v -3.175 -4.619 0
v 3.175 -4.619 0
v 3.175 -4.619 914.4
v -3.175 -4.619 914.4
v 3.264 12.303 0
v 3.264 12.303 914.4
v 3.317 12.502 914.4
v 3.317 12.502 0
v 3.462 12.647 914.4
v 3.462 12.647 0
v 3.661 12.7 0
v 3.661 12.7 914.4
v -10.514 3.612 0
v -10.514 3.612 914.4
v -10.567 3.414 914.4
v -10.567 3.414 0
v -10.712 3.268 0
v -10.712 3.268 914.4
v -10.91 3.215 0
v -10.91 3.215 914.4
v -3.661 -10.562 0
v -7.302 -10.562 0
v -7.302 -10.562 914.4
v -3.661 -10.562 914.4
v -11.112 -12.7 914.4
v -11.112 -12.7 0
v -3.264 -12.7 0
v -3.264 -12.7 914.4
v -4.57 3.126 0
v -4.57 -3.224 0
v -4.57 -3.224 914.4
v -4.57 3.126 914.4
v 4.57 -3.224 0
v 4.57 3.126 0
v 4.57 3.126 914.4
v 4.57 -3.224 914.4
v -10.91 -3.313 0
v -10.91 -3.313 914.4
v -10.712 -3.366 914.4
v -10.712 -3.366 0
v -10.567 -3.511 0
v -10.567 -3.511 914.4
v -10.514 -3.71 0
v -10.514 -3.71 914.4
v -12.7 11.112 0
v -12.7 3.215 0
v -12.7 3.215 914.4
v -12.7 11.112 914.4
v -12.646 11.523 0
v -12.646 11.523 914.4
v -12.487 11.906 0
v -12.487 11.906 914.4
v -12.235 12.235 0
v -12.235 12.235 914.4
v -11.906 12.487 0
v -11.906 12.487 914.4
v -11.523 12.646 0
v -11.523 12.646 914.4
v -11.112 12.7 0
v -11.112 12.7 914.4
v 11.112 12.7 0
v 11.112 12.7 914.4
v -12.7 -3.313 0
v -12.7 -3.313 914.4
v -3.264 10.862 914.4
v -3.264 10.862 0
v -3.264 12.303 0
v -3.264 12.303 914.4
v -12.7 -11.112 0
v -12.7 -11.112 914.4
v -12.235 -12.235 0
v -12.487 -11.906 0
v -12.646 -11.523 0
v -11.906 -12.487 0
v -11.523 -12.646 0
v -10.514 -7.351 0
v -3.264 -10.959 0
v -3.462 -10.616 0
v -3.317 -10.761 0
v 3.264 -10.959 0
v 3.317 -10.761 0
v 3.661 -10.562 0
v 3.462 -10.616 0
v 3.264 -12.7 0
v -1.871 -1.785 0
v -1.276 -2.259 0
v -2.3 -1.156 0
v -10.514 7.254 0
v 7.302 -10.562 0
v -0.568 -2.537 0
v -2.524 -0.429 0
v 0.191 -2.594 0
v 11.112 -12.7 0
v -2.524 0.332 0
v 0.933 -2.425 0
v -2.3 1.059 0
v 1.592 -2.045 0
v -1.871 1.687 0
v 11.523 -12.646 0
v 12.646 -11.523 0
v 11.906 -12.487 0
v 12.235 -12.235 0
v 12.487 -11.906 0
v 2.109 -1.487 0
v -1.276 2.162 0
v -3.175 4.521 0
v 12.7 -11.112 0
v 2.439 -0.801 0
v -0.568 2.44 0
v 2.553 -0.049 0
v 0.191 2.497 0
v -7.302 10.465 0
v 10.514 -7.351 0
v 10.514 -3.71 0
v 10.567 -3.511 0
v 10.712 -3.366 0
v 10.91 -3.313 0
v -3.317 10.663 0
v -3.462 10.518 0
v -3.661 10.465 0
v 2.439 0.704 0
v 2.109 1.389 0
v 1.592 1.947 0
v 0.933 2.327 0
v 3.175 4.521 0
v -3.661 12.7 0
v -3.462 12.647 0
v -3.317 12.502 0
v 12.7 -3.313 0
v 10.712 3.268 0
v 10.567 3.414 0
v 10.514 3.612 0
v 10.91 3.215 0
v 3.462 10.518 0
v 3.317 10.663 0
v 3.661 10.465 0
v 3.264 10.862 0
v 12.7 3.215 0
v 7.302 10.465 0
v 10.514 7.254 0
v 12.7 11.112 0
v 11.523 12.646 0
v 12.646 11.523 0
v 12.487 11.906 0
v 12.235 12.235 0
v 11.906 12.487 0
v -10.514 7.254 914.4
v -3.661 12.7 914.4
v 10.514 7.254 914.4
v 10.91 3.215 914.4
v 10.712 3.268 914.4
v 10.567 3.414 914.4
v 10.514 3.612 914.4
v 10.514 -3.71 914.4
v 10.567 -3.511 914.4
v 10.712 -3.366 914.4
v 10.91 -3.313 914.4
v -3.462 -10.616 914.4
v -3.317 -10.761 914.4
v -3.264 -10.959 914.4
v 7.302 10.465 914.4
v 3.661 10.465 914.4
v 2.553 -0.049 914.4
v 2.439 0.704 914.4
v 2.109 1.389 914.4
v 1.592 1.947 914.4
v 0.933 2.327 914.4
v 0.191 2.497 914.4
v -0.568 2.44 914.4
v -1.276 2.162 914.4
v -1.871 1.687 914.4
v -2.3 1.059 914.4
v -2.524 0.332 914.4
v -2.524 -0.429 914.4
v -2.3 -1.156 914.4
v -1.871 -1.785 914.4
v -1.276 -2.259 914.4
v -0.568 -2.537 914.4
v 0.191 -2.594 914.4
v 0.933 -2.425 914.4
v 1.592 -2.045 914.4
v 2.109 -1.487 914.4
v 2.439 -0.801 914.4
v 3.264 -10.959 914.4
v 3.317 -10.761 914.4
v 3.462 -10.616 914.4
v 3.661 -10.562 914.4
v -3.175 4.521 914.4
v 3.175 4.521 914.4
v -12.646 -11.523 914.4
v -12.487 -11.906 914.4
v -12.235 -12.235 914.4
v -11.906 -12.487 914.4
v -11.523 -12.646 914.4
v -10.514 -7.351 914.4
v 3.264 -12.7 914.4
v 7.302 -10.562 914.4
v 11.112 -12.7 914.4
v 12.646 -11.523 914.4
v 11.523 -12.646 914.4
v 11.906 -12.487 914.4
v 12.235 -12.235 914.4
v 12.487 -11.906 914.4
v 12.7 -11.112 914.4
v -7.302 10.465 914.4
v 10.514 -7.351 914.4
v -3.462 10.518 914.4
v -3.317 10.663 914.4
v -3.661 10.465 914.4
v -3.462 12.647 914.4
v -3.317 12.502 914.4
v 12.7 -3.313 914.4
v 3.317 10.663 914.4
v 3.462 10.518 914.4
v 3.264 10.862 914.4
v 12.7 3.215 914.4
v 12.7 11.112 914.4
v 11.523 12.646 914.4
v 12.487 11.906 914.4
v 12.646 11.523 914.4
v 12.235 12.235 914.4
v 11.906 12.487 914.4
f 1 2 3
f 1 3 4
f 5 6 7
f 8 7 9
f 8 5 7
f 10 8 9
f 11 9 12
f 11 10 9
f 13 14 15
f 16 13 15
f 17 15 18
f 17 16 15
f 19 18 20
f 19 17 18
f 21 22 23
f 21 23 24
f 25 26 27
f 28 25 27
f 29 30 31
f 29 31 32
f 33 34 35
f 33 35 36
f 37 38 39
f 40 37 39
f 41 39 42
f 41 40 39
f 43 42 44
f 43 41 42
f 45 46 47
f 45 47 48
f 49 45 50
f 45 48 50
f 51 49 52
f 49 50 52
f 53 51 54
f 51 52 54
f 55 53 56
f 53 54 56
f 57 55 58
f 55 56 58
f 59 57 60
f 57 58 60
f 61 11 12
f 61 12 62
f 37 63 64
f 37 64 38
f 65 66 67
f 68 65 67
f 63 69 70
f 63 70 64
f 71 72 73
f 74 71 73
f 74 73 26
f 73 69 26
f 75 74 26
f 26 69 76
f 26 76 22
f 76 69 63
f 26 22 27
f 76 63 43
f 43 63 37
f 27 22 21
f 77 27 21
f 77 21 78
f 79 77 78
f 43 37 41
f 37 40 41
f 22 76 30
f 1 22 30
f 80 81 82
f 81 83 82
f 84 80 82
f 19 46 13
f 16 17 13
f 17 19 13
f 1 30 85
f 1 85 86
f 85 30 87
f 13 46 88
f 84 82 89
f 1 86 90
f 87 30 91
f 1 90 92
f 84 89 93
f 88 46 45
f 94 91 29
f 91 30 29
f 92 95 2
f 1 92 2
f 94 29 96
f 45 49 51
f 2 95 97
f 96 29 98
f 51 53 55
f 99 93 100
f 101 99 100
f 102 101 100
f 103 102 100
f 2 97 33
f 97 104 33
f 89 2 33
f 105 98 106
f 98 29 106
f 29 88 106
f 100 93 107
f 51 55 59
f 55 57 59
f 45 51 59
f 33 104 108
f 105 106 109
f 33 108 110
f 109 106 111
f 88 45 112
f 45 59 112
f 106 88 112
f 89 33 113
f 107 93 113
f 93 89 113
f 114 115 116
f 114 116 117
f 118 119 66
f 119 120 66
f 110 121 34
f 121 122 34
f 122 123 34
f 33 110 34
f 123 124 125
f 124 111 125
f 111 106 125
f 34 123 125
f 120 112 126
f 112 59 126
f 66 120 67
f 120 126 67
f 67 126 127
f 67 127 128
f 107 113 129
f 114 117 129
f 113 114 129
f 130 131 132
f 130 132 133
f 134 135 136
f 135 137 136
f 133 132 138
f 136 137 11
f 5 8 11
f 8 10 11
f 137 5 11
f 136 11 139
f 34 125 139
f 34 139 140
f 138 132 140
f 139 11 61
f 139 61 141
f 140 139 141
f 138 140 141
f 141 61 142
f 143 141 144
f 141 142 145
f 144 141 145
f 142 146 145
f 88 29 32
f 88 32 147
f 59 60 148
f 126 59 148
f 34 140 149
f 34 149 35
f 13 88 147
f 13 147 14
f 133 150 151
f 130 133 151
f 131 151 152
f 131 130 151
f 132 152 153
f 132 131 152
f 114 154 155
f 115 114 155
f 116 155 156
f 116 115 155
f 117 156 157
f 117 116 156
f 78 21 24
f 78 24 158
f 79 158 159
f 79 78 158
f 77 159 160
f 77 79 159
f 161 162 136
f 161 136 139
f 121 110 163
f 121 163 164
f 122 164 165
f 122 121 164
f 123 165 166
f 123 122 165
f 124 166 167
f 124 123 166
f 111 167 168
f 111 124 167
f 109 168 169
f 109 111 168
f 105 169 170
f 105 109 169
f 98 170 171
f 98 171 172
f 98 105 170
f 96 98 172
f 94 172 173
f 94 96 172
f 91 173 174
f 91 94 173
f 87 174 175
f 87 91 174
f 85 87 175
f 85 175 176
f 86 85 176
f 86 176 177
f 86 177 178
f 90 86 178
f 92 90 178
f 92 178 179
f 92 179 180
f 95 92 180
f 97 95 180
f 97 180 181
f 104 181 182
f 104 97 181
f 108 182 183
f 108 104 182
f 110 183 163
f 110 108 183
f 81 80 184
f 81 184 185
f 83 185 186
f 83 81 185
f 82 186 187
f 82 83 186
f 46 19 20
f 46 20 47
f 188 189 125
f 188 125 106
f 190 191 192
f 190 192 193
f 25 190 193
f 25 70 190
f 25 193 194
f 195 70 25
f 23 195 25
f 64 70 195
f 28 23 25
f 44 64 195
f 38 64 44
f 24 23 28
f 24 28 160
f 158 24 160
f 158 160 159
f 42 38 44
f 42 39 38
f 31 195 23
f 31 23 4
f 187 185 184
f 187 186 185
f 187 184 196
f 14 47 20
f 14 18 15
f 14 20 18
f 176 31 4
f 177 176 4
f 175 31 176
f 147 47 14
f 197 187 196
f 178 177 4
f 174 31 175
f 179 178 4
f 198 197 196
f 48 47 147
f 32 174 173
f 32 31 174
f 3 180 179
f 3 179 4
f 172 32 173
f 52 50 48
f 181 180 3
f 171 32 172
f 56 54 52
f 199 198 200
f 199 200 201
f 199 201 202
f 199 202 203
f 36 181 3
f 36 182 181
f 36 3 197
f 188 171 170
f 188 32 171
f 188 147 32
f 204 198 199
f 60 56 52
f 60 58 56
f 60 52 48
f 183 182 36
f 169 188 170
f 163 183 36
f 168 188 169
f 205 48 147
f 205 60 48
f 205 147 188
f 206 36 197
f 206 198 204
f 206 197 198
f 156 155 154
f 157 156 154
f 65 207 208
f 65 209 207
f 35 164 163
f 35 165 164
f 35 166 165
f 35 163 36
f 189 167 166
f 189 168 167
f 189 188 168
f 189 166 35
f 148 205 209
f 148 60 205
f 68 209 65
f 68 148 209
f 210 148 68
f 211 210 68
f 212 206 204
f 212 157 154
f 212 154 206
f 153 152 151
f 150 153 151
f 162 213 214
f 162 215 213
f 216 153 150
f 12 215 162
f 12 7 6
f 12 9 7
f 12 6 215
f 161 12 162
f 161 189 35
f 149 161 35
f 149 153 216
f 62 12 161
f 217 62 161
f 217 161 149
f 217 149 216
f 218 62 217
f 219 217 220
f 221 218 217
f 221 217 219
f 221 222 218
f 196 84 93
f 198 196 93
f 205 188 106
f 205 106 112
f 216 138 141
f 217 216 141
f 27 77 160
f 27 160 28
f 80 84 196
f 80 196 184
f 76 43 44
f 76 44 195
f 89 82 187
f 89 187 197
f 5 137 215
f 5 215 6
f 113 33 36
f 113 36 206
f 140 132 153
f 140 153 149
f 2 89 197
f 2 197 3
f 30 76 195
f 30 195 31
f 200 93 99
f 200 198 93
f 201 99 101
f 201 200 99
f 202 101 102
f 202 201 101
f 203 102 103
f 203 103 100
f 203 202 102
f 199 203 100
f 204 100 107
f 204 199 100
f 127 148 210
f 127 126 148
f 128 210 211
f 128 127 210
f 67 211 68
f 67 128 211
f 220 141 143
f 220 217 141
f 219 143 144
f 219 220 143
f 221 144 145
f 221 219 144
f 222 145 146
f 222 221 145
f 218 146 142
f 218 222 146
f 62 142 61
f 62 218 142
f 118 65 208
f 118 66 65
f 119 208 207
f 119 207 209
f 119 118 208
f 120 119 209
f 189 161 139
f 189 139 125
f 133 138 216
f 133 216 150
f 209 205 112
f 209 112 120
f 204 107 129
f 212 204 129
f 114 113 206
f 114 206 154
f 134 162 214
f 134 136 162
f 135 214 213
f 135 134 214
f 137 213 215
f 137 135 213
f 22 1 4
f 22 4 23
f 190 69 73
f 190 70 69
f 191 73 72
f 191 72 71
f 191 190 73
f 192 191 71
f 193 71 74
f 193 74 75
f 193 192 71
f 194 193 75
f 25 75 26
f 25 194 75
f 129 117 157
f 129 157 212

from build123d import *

# Parameters (mm, degrees)
SKETCH1_W           = 25.4
SKETCH1_H           = 25.4
BOSS_EXTRUDE1_DEPTH = 914.4
FILLET1_R           = 1.5875
HOLE1_OUTLINE_R     = 2.5527
HOLE1_DEPTH         = 914.4
SKETCH7_W           = 6.5278
SKETCH7_H           = 2.2352
CUT_EXTRUDE2_DEPTH  = 914.4
FILLET4_R           = 0.396875
CIRPATTERN2_DEPTH   = 914.4


# Read off the part's stored shape, not the designer's step: Hole1, CirPattern2
with BuildPart() as part:
    # Sketch1 → Boss-Extrude1 (new body)
    with BuildSketch(Plane.XY):
        Rectangle(SKETCH1_W, SKETCH1_H)
    extrude(amount=BOSS_EXTRUDE1_DEPTH)

    # Fillet1
    fillet1_edges = [part.edges().sort_by_distance(p)[0] for p in [
        (12.7, -12.7, 457.2),
        (-12.7, -12.7, 457.2),
        (-12.7, 12.7, 457.2),
        (12.7, 12.7, 457.2),
    ]]
    fillet(fillet1_edges, radius=FILLET1_R)

    # Hole1 outline → Hole1 (cut)
    with BuildSketch(Plane.XY):
        with Locations((0, -0.048792482)):
            Circle(HOLE1_OUTLINE_R)
    extrude(amount=HOLE1_DEPTH, mode=Mode.SUBTRACT)

    # Sketch7 → Cut-Extrude2 (cut)
    with BuildSketch(Plane.XY.offset(914.4)):
        with Locations((0, 11.5824)):
            Rectangle(SKETCH7_W, SKETCH7_H)
        Polygon((-3.175, 4.5212), (-7.3025, 10.4648), (7.3025, 10.4648), (3.175, 4.5212), align=None)
    extrude(amount=-CUT_EXTRUDE2_DEPTH, mode=Mode.SUBTRACT)

    # Fillet4
    fillet4_edges = [part.edges().sort_by_distance(p)[0] for p in [
        (-3.2639, 10.4648, 457.2),
        (-3.2639, 12.7, 457.2),
        (3.2639, 12.7, 457.2),
        (3.2639, 10.4648, 457.2),
    ]]
    fillet(fillet4_edges, radius=FILLET4_R)

    # CirPattern2 outline → CirPattern2 (cut)
    with BuildSketch(Plane.XY):
        with BuildLine():
            ThreePointArc((-3.660775, -10.562384964), (-3.380141996, -10.67862696), (-3.2639, -10.959259964))
            Line((-3.2639, -10.959259964), (-3.2639, -12.7))
            Line((-3.2639, -12.7), (3.2639, -12.7))
            Line((3.2639, -12.7), (3.2639, -10.959259964))
            ThreePointArc((3.2639, -10.959259964), (3.380141996, -10.67862696), (3.660775, -10.562384964))
            Line((3.660775, -10.562384964), (7.3025, -10.562384964))
            Line((7.3025, -10.562384964), (3.175, -4.618784964))
            Line((3.175, -4.618784964), (-3.175, -4.618784964))
            Line((-3.175, -4.618784964), (-7.3025, -10.562384964))
            Line((-7.3025, -10.562384964), (-3.660775, -10.562384964))
        make_face()
        with BuildLine():
            Line((-12.7, -3.312692482), (-10.910467482, -3.312692482))
            ThreePointArc((-10.910467482, -3.312692482), (-10.629834478, -3.428934478), (-10.513592482, -3.709567482))
            Line((-10.513592482, -3.709567482), (-10.513592482, -7.351292482))
            Line((-10.513592482, -7.351292482), (-4.569992482, -3.223792482))
            Line((-4.569992482, -3.223792482), (-4.569992482, 3.126207518))
            Line((-4.569992482, 3.126207518), (-10.513592482, 7.253707518))
            Line((-10.513592482, 7.253707518), (-10.513592482, 3.611982518))
            ThreePointArc((-10.513592482, 3.611982518), (-10.629834478, 3.331349514), (-10.910467482, 3.215107518))
            Line((-10.910467482, 3.215107518), (-12.7, 3.215107518))
            Line((-12.7, 3.215107518), (-12.7, -3.312692482))
        make_face()
        with BuildLine():
            ThreePointArc((10.513592482, -3.709567482), (10.629834478, -3.428934478), (10.910467482, -3.312692482))
            Line((10.910467482, -3.312692482), (12.7, -3.312692482))
            Line((12.7, -3.312692482), (12.7, 3.215107518))
            Line((12.7, 3.215107518), (10.910467482, 3.215107518))
            ThreePointArc((10.910467482, 3.215107518), (10.629834478, 3.331349514), (10.513592482, 3.611982518))
            Line((10.513592482, 3.611982518), (10.513592482, 7.253707518))
            Line((10.513592482, 7.253707518), (4.569992482, 3.126207518))
            Line((4.569992482, 3.126207518), (4.569992482, -3.223792482))
            Line((4.569992482, -3.223792482), (10.513592482, -7.351292482))
            Line((10.513592482, -7.351292482), (10.513592482, -3.709567482))
        make_face()
    extrude(amount=CIRPATTERN2_DEPTH, mode=Mode.SUBTRACT)


solid = part.part
